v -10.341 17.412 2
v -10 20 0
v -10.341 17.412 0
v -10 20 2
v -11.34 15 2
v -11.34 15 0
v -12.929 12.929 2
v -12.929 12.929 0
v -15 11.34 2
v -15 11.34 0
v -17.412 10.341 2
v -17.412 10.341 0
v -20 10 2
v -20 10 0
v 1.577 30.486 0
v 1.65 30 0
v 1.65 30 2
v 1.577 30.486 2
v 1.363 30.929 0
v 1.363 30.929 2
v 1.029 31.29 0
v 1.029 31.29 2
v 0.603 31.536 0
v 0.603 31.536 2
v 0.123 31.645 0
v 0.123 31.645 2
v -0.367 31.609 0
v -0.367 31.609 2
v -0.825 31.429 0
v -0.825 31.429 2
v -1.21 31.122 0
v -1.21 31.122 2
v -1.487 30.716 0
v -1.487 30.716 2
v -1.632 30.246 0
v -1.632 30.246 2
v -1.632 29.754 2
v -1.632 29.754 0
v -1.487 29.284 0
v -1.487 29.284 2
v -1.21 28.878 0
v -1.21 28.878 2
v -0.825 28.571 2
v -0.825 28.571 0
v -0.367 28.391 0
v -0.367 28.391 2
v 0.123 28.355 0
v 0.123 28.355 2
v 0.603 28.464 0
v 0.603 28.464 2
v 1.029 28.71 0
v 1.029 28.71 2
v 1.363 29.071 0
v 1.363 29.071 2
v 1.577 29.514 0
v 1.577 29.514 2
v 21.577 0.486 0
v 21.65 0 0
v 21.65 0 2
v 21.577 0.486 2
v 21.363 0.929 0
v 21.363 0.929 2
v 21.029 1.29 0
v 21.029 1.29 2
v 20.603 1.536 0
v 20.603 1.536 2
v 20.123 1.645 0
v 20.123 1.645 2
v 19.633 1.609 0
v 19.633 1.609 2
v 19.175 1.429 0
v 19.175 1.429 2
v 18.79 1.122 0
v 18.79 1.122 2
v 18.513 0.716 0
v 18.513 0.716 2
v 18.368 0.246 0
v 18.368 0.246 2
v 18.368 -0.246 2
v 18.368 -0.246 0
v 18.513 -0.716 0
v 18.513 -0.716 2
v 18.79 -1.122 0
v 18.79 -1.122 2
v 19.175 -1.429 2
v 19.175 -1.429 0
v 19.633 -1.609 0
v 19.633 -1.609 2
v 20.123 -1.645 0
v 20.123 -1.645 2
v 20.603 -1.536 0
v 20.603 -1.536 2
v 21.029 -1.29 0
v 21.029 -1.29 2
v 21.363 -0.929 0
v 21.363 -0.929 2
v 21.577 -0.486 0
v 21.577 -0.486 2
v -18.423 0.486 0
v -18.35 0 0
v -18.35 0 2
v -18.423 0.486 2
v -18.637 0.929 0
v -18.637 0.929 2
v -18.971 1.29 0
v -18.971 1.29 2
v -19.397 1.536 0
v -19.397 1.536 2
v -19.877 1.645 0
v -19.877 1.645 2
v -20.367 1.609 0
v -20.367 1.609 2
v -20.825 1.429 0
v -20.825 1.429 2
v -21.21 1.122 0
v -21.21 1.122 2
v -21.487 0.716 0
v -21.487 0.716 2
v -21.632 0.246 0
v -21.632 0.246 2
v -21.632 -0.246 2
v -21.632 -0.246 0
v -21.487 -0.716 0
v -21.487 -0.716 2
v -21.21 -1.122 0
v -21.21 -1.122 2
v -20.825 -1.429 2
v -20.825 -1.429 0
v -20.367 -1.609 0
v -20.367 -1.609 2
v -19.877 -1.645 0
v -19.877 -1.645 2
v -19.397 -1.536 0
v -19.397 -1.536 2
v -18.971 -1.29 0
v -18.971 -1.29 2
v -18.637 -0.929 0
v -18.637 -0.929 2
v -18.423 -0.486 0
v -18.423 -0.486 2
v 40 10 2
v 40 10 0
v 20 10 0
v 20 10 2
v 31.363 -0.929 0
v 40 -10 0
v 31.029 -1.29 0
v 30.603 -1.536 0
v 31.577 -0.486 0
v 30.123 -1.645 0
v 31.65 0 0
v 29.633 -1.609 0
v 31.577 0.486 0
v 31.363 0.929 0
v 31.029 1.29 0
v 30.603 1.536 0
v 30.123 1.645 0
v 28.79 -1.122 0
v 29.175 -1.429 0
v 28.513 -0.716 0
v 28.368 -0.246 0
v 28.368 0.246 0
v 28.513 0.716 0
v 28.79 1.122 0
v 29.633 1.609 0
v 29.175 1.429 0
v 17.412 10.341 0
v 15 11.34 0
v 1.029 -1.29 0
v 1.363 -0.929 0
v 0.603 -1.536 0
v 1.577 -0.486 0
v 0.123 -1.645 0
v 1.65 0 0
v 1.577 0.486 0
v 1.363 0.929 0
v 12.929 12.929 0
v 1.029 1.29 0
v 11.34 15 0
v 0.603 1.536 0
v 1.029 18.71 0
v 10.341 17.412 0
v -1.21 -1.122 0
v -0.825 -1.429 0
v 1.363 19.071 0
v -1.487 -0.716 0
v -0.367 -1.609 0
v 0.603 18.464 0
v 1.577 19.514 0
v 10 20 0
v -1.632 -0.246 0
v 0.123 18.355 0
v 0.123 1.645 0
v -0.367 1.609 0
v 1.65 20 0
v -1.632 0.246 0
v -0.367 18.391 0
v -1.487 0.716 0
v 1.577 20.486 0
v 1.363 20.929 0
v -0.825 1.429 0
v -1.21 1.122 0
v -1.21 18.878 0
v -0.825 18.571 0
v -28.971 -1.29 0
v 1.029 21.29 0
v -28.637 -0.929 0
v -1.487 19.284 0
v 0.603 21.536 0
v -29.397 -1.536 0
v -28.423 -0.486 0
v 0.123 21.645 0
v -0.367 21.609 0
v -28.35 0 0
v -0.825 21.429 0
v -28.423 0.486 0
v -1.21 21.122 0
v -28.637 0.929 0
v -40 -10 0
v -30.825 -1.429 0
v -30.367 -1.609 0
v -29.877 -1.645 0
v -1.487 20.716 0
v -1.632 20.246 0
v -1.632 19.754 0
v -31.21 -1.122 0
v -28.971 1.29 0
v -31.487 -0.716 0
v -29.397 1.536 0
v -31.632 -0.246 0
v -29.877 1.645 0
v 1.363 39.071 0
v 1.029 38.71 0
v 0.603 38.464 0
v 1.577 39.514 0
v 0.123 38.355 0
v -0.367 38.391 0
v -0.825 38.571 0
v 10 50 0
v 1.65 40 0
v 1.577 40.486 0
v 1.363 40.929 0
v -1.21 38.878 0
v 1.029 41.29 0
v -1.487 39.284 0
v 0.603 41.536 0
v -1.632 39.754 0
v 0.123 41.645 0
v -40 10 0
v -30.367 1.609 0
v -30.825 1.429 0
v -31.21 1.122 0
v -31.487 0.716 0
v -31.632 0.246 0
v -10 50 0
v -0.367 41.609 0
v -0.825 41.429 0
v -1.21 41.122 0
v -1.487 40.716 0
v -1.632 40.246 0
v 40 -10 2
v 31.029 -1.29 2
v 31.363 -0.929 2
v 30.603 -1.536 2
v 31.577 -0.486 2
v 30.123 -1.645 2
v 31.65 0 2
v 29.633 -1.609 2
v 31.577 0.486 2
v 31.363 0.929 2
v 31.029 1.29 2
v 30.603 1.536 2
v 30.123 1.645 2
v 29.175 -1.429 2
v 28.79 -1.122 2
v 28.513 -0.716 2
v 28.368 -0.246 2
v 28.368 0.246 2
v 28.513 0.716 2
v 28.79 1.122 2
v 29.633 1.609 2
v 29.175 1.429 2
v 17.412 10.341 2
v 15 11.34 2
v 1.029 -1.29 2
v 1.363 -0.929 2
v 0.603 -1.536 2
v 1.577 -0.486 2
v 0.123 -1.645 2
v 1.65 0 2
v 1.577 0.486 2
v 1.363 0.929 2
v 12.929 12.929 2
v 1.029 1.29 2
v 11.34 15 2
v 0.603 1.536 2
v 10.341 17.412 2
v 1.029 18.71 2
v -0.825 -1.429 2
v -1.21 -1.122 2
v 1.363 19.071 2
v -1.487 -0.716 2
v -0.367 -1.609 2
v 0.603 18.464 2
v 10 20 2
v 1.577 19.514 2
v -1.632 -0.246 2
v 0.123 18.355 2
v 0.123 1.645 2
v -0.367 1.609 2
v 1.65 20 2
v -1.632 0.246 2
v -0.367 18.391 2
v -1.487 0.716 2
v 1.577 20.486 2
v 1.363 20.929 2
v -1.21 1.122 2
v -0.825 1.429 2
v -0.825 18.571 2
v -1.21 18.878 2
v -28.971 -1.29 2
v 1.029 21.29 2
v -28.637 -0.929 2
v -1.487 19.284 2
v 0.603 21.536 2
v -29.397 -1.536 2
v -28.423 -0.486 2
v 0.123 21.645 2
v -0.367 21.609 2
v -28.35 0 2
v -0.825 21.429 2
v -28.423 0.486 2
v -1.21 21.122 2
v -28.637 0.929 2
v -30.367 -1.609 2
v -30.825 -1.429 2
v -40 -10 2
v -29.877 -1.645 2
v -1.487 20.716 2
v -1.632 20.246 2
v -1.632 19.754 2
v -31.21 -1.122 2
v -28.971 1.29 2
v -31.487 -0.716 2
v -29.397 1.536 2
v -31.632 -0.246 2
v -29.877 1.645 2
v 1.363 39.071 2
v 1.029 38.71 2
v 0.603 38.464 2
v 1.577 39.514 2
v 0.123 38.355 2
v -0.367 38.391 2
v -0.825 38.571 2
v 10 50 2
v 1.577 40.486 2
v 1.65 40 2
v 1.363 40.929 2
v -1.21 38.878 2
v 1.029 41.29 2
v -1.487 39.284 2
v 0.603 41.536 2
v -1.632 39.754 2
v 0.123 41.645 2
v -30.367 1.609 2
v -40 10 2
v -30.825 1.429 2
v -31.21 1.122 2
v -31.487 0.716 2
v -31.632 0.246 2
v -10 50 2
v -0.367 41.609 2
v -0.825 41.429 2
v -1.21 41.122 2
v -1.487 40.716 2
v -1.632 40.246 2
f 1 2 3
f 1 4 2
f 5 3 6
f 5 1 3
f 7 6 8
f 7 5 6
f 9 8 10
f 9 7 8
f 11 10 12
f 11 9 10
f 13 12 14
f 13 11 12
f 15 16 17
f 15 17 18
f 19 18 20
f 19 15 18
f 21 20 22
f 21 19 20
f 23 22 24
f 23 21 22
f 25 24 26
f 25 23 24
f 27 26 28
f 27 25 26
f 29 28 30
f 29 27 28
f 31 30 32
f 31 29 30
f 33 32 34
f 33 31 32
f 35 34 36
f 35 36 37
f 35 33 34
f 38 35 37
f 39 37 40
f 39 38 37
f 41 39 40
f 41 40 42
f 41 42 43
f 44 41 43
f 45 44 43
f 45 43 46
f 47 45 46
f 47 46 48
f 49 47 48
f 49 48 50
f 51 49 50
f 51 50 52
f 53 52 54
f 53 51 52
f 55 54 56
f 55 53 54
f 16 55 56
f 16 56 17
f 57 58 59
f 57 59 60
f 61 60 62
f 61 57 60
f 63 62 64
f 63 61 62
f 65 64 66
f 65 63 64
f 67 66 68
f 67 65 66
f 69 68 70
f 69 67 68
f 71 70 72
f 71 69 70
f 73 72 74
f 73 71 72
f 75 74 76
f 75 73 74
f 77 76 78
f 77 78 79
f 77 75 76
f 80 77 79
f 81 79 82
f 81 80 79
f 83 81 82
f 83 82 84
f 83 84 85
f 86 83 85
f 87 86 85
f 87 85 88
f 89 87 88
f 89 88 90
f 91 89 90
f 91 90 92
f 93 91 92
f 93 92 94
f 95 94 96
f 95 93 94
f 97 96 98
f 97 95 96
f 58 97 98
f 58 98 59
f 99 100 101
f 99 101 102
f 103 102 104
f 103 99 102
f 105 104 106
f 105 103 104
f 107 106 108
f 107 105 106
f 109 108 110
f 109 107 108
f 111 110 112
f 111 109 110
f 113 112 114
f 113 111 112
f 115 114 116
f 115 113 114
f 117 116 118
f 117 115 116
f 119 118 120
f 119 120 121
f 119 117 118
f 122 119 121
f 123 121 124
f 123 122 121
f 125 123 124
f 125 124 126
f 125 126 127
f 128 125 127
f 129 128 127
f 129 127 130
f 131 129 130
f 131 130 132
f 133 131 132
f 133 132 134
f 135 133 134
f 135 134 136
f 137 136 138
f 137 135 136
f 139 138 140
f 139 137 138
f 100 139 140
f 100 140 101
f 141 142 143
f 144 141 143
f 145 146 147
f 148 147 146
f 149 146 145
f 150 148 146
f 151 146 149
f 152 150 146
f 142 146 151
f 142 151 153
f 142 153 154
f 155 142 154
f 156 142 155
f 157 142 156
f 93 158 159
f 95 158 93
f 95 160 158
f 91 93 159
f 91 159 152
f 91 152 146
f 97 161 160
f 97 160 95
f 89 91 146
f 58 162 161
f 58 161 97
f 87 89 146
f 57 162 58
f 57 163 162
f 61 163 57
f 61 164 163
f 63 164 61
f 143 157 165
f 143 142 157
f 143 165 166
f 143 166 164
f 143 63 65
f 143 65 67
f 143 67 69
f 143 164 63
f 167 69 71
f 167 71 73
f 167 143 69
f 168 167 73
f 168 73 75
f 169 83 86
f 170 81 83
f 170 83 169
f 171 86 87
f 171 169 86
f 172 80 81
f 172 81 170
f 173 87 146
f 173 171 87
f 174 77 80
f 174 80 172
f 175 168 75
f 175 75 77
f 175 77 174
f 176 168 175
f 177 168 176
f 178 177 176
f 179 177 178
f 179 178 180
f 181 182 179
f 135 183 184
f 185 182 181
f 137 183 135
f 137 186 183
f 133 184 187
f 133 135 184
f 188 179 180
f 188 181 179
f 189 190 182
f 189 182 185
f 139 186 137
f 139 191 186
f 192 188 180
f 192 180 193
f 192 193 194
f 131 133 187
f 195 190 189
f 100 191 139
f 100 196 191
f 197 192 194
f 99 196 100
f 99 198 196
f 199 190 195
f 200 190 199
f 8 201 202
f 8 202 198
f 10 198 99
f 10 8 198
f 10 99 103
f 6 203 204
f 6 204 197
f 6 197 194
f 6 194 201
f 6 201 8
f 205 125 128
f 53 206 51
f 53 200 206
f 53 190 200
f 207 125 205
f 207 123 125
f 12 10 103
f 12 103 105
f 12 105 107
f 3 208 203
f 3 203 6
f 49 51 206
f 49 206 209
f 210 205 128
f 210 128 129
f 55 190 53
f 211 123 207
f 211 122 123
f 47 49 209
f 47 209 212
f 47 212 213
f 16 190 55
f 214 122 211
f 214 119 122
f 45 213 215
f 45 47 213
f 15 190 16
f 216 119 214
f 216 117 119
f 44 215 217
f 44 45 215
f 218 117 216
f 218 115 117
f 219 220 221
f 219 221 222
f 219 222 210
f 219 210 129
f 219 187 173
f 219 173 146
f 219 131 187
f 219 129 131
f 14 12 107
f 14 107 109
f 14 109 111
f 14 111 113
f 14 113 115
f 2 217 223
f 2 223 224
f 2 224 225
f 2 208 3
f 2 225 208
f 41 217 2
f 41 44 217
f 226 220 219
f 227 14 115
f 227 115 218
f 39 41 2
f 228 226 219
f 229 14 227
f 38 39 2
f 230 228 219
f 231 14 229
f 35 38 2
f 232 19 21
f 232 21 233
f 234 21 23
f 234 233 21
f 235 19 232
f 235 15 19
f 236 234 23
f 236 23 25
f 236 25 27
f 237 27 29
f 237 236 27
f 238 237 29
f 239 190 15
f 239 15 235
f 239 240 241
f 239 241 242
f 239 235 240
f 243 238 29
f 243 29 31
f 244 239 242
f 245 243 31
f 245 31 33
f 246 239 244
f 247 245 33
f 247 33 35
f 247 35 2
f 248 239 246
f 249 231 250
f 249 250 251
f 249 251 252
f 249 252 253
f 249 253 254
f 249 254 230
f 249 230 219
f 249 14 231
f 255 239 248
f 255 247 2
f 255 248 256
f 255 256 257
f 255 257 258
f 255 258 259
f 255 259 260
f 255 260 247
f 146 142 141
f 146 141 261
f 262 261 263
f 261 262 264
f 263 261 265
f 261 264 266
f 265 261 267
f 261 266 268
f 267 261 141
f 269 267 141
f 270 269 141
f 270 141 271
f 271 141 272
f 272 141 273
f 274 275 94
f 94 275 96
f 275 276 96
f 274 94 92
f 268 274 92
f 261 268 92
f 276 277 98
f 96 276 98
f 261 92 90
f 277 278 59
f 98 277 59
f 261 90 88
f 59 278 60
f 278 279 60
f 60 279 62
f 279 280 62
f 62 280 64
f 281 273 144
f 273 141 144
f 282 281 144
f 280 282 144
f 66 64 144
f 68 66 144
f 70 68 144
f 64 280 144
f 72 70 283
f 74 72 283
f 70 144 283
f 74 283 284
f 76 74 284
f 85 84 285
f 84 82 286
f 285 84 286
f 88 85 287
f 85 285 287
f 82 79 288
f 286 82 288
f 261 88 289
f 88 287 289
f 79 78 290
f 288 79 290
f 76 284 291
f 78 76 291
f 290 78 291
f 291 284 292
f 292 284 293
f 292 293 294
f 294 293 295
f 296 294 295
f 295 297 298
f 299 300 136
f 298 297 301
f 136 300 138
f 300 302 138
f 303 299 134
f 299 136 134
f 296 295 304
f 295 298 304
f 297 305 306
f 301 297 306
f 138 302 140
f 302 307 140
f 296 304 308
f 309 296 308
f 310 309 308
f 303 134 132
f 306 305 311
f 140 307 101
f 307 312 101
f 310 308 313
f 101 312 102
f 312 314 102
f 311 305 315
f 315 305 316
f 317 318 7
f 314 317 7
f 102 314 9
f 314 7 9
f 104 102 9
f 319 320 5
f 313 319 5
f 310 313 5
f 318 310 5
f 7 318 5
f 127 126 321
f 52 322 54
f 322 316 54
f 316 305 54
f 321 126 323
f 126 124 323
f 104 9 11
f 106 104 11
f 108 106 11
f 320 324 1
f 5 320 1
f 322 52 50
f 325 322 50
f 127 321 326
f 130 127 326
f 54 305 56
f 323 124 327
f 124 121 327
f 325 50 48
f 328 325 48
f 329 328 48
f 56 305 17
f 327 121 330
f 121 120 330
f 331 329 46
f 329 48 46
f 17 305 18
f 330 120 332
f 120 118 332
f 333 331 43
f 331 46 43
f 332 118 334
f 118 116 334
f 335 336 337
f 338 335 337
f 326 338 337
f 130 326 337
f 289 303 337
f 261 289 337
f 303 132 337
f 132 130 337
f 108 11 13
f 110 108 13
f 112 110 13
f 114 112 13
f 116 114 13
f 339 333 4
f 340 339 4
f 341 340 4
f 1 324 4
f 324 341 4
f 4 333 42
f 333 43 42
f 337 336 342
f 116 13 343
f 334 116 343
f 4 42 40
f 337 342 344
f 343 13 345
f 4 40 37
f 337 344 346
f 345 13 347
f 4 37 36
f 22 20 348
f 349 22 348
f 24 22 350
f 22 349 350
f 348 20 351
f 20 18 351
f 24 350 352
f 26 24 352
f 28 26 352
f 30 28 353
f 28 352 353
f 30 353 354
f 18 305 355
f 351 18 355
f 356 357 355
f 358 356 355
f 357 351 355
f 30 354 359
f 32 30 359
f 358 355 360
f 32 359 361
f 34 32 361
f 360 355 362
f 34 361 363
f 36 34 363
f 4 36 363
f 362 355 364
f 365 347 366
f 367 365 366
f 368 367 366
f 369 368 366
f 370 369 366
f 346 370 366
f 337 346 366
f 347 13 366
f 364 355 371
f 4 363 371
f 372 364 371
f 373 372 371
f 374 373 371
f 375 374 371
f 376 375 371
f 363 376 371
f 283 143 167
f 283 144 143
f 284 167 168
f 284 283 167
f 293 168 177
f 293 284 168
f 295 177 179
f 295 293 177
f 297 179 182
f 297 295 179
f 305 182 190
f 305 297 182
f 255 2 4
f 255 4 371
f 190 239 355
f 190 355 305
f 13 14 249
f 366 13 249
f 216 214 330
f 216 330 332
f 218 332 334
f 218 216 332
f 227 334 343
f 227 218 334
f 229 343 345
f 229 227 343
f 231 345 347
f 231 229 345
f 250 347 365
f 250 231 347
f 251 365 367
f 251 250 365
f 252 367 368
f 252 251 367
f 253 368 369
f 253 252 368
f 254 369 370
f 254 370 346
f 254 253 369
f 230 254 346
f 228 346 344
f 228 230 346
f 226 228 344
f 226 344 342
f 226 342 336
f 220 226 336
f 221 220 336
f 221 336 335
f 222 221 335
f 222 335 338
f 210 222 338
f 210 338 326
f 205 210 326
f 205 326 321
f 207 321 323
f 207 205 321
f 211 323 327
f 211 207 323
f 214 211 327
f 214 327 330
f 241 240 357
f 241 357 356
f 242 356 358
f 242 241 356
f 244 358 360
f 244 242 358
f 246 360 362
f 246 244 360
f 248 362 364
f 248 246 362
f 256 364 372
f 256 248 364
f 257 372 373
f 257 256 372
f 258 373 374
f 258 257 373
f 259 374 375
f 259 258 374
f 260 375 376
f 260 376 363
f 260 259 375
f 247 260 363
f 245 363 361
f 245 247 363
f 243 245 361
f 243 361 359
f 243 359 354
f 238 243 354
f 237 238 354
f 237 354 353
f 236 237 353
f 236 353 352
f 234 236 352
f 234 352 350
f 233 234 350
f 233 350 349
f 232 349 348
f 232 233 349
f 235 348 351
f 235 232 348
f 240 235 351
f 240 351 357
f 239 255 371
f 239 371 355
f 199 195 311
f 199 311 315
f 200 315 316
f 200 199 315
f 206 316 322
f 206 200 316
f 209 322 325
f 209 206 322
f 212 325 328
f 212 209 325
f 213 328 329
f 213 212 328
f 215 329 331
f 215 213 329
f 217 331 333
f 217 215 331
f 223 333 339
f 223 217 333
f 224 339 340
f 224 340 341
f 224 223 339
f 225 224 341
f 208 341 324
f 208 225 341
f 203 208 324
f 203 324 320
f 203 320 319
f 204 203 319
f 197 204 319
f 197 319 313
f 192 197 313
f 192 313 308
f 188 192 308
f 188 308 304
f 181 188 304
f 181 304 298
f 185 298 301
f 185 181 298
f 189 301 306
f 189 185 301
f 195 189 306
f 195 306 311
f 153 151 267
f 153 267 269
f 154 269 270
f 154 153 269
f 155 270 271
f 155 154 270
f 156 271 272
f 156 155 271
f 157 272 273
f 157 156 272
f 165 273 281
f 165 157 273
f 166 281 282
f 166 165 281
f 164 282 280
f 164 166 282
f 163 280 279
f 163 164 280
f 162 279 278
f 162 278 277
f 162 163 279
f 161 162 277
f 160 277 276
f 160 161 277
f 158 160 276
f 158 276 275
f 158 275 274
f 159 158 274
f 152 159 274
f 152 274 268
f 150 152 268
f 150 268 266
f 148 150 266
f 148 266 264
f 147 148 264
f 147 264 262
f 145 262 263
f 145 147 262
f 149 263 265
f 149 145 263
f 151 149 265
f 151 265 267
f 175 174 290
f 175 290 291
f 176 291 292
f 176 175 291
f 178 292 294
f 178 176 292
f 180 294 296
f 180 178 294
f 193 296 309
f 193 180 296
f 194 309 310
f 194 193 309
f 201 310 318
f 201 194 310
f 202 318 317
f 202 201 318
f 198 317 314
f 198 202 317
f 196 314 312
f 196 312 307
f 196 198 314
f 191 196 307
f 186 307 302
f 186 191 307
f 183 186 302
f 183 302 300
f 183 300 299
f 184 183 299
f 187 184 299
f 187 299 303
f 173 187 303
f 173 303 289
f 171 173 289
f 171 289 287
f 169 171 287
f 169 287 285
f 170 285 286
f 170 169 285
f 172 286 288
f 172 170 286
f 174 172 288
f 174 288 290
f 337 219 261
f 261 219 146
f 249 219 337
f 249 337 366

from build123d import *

# Parameters (mm, degrees)
SKETCH_1_R      = 1.65
EXTRUDE_1_DEPTH = 2
FILLET_1_R      = 10


with BuildPart() as part:
    # 草图1 → 凸台-拉伸1 (new body)
    with BuildSketch(Plane.XY):
        Polygon((10, 10), (30, 10), (40, 10), (40, -10), (30, -10), (-30, -10), (-40, -10), (-40, 10), (-30, 10), (-10, 10), (-10, 50), (10, 50), align=None)
        Circle(SKETCH_1_R, mode=Mode.SUBTRACT)
        with Locations((-20, 0)):
            Circle(SKETCH_1_R, mode=Mode.SUBTRACT)
        with Locations((20, 0)):
            Circle(SKETCH_1_R, mode=Mode.SUBTRACT)
        with Locations((0, 20)):
            Circle(SKETCH_1_R, mode=Mode.SUBTRACT)
        with Locations((0, 30)):
            Circle(SKETCH_1_R, mode=Mode.SUBTRACT)
        with Locations((0, 40)):
            Circle(SKETCH_1_R, mode=Mode.SUBTRACT)
        with Locations((30, 0)):
            Circle(SKETCH_1_R, mode=Mode.SUBTRACT)
        with Locations((-30, 0)):
            Circle(SKETCH_1_R, mode=Mode.SUBTRACT)
    extrude(amount=EXTRUDE_1_DEPTH)

    # 圆角1
    fillet_1_edges = [part.edges().sort_by_distance(p)[0] for p in [
        (-10, 10, 1),
        (10, 10, 1),
    ]]
    fillet(fillet_1_edges, radius=FILLET_1_R)


solid = part.part
